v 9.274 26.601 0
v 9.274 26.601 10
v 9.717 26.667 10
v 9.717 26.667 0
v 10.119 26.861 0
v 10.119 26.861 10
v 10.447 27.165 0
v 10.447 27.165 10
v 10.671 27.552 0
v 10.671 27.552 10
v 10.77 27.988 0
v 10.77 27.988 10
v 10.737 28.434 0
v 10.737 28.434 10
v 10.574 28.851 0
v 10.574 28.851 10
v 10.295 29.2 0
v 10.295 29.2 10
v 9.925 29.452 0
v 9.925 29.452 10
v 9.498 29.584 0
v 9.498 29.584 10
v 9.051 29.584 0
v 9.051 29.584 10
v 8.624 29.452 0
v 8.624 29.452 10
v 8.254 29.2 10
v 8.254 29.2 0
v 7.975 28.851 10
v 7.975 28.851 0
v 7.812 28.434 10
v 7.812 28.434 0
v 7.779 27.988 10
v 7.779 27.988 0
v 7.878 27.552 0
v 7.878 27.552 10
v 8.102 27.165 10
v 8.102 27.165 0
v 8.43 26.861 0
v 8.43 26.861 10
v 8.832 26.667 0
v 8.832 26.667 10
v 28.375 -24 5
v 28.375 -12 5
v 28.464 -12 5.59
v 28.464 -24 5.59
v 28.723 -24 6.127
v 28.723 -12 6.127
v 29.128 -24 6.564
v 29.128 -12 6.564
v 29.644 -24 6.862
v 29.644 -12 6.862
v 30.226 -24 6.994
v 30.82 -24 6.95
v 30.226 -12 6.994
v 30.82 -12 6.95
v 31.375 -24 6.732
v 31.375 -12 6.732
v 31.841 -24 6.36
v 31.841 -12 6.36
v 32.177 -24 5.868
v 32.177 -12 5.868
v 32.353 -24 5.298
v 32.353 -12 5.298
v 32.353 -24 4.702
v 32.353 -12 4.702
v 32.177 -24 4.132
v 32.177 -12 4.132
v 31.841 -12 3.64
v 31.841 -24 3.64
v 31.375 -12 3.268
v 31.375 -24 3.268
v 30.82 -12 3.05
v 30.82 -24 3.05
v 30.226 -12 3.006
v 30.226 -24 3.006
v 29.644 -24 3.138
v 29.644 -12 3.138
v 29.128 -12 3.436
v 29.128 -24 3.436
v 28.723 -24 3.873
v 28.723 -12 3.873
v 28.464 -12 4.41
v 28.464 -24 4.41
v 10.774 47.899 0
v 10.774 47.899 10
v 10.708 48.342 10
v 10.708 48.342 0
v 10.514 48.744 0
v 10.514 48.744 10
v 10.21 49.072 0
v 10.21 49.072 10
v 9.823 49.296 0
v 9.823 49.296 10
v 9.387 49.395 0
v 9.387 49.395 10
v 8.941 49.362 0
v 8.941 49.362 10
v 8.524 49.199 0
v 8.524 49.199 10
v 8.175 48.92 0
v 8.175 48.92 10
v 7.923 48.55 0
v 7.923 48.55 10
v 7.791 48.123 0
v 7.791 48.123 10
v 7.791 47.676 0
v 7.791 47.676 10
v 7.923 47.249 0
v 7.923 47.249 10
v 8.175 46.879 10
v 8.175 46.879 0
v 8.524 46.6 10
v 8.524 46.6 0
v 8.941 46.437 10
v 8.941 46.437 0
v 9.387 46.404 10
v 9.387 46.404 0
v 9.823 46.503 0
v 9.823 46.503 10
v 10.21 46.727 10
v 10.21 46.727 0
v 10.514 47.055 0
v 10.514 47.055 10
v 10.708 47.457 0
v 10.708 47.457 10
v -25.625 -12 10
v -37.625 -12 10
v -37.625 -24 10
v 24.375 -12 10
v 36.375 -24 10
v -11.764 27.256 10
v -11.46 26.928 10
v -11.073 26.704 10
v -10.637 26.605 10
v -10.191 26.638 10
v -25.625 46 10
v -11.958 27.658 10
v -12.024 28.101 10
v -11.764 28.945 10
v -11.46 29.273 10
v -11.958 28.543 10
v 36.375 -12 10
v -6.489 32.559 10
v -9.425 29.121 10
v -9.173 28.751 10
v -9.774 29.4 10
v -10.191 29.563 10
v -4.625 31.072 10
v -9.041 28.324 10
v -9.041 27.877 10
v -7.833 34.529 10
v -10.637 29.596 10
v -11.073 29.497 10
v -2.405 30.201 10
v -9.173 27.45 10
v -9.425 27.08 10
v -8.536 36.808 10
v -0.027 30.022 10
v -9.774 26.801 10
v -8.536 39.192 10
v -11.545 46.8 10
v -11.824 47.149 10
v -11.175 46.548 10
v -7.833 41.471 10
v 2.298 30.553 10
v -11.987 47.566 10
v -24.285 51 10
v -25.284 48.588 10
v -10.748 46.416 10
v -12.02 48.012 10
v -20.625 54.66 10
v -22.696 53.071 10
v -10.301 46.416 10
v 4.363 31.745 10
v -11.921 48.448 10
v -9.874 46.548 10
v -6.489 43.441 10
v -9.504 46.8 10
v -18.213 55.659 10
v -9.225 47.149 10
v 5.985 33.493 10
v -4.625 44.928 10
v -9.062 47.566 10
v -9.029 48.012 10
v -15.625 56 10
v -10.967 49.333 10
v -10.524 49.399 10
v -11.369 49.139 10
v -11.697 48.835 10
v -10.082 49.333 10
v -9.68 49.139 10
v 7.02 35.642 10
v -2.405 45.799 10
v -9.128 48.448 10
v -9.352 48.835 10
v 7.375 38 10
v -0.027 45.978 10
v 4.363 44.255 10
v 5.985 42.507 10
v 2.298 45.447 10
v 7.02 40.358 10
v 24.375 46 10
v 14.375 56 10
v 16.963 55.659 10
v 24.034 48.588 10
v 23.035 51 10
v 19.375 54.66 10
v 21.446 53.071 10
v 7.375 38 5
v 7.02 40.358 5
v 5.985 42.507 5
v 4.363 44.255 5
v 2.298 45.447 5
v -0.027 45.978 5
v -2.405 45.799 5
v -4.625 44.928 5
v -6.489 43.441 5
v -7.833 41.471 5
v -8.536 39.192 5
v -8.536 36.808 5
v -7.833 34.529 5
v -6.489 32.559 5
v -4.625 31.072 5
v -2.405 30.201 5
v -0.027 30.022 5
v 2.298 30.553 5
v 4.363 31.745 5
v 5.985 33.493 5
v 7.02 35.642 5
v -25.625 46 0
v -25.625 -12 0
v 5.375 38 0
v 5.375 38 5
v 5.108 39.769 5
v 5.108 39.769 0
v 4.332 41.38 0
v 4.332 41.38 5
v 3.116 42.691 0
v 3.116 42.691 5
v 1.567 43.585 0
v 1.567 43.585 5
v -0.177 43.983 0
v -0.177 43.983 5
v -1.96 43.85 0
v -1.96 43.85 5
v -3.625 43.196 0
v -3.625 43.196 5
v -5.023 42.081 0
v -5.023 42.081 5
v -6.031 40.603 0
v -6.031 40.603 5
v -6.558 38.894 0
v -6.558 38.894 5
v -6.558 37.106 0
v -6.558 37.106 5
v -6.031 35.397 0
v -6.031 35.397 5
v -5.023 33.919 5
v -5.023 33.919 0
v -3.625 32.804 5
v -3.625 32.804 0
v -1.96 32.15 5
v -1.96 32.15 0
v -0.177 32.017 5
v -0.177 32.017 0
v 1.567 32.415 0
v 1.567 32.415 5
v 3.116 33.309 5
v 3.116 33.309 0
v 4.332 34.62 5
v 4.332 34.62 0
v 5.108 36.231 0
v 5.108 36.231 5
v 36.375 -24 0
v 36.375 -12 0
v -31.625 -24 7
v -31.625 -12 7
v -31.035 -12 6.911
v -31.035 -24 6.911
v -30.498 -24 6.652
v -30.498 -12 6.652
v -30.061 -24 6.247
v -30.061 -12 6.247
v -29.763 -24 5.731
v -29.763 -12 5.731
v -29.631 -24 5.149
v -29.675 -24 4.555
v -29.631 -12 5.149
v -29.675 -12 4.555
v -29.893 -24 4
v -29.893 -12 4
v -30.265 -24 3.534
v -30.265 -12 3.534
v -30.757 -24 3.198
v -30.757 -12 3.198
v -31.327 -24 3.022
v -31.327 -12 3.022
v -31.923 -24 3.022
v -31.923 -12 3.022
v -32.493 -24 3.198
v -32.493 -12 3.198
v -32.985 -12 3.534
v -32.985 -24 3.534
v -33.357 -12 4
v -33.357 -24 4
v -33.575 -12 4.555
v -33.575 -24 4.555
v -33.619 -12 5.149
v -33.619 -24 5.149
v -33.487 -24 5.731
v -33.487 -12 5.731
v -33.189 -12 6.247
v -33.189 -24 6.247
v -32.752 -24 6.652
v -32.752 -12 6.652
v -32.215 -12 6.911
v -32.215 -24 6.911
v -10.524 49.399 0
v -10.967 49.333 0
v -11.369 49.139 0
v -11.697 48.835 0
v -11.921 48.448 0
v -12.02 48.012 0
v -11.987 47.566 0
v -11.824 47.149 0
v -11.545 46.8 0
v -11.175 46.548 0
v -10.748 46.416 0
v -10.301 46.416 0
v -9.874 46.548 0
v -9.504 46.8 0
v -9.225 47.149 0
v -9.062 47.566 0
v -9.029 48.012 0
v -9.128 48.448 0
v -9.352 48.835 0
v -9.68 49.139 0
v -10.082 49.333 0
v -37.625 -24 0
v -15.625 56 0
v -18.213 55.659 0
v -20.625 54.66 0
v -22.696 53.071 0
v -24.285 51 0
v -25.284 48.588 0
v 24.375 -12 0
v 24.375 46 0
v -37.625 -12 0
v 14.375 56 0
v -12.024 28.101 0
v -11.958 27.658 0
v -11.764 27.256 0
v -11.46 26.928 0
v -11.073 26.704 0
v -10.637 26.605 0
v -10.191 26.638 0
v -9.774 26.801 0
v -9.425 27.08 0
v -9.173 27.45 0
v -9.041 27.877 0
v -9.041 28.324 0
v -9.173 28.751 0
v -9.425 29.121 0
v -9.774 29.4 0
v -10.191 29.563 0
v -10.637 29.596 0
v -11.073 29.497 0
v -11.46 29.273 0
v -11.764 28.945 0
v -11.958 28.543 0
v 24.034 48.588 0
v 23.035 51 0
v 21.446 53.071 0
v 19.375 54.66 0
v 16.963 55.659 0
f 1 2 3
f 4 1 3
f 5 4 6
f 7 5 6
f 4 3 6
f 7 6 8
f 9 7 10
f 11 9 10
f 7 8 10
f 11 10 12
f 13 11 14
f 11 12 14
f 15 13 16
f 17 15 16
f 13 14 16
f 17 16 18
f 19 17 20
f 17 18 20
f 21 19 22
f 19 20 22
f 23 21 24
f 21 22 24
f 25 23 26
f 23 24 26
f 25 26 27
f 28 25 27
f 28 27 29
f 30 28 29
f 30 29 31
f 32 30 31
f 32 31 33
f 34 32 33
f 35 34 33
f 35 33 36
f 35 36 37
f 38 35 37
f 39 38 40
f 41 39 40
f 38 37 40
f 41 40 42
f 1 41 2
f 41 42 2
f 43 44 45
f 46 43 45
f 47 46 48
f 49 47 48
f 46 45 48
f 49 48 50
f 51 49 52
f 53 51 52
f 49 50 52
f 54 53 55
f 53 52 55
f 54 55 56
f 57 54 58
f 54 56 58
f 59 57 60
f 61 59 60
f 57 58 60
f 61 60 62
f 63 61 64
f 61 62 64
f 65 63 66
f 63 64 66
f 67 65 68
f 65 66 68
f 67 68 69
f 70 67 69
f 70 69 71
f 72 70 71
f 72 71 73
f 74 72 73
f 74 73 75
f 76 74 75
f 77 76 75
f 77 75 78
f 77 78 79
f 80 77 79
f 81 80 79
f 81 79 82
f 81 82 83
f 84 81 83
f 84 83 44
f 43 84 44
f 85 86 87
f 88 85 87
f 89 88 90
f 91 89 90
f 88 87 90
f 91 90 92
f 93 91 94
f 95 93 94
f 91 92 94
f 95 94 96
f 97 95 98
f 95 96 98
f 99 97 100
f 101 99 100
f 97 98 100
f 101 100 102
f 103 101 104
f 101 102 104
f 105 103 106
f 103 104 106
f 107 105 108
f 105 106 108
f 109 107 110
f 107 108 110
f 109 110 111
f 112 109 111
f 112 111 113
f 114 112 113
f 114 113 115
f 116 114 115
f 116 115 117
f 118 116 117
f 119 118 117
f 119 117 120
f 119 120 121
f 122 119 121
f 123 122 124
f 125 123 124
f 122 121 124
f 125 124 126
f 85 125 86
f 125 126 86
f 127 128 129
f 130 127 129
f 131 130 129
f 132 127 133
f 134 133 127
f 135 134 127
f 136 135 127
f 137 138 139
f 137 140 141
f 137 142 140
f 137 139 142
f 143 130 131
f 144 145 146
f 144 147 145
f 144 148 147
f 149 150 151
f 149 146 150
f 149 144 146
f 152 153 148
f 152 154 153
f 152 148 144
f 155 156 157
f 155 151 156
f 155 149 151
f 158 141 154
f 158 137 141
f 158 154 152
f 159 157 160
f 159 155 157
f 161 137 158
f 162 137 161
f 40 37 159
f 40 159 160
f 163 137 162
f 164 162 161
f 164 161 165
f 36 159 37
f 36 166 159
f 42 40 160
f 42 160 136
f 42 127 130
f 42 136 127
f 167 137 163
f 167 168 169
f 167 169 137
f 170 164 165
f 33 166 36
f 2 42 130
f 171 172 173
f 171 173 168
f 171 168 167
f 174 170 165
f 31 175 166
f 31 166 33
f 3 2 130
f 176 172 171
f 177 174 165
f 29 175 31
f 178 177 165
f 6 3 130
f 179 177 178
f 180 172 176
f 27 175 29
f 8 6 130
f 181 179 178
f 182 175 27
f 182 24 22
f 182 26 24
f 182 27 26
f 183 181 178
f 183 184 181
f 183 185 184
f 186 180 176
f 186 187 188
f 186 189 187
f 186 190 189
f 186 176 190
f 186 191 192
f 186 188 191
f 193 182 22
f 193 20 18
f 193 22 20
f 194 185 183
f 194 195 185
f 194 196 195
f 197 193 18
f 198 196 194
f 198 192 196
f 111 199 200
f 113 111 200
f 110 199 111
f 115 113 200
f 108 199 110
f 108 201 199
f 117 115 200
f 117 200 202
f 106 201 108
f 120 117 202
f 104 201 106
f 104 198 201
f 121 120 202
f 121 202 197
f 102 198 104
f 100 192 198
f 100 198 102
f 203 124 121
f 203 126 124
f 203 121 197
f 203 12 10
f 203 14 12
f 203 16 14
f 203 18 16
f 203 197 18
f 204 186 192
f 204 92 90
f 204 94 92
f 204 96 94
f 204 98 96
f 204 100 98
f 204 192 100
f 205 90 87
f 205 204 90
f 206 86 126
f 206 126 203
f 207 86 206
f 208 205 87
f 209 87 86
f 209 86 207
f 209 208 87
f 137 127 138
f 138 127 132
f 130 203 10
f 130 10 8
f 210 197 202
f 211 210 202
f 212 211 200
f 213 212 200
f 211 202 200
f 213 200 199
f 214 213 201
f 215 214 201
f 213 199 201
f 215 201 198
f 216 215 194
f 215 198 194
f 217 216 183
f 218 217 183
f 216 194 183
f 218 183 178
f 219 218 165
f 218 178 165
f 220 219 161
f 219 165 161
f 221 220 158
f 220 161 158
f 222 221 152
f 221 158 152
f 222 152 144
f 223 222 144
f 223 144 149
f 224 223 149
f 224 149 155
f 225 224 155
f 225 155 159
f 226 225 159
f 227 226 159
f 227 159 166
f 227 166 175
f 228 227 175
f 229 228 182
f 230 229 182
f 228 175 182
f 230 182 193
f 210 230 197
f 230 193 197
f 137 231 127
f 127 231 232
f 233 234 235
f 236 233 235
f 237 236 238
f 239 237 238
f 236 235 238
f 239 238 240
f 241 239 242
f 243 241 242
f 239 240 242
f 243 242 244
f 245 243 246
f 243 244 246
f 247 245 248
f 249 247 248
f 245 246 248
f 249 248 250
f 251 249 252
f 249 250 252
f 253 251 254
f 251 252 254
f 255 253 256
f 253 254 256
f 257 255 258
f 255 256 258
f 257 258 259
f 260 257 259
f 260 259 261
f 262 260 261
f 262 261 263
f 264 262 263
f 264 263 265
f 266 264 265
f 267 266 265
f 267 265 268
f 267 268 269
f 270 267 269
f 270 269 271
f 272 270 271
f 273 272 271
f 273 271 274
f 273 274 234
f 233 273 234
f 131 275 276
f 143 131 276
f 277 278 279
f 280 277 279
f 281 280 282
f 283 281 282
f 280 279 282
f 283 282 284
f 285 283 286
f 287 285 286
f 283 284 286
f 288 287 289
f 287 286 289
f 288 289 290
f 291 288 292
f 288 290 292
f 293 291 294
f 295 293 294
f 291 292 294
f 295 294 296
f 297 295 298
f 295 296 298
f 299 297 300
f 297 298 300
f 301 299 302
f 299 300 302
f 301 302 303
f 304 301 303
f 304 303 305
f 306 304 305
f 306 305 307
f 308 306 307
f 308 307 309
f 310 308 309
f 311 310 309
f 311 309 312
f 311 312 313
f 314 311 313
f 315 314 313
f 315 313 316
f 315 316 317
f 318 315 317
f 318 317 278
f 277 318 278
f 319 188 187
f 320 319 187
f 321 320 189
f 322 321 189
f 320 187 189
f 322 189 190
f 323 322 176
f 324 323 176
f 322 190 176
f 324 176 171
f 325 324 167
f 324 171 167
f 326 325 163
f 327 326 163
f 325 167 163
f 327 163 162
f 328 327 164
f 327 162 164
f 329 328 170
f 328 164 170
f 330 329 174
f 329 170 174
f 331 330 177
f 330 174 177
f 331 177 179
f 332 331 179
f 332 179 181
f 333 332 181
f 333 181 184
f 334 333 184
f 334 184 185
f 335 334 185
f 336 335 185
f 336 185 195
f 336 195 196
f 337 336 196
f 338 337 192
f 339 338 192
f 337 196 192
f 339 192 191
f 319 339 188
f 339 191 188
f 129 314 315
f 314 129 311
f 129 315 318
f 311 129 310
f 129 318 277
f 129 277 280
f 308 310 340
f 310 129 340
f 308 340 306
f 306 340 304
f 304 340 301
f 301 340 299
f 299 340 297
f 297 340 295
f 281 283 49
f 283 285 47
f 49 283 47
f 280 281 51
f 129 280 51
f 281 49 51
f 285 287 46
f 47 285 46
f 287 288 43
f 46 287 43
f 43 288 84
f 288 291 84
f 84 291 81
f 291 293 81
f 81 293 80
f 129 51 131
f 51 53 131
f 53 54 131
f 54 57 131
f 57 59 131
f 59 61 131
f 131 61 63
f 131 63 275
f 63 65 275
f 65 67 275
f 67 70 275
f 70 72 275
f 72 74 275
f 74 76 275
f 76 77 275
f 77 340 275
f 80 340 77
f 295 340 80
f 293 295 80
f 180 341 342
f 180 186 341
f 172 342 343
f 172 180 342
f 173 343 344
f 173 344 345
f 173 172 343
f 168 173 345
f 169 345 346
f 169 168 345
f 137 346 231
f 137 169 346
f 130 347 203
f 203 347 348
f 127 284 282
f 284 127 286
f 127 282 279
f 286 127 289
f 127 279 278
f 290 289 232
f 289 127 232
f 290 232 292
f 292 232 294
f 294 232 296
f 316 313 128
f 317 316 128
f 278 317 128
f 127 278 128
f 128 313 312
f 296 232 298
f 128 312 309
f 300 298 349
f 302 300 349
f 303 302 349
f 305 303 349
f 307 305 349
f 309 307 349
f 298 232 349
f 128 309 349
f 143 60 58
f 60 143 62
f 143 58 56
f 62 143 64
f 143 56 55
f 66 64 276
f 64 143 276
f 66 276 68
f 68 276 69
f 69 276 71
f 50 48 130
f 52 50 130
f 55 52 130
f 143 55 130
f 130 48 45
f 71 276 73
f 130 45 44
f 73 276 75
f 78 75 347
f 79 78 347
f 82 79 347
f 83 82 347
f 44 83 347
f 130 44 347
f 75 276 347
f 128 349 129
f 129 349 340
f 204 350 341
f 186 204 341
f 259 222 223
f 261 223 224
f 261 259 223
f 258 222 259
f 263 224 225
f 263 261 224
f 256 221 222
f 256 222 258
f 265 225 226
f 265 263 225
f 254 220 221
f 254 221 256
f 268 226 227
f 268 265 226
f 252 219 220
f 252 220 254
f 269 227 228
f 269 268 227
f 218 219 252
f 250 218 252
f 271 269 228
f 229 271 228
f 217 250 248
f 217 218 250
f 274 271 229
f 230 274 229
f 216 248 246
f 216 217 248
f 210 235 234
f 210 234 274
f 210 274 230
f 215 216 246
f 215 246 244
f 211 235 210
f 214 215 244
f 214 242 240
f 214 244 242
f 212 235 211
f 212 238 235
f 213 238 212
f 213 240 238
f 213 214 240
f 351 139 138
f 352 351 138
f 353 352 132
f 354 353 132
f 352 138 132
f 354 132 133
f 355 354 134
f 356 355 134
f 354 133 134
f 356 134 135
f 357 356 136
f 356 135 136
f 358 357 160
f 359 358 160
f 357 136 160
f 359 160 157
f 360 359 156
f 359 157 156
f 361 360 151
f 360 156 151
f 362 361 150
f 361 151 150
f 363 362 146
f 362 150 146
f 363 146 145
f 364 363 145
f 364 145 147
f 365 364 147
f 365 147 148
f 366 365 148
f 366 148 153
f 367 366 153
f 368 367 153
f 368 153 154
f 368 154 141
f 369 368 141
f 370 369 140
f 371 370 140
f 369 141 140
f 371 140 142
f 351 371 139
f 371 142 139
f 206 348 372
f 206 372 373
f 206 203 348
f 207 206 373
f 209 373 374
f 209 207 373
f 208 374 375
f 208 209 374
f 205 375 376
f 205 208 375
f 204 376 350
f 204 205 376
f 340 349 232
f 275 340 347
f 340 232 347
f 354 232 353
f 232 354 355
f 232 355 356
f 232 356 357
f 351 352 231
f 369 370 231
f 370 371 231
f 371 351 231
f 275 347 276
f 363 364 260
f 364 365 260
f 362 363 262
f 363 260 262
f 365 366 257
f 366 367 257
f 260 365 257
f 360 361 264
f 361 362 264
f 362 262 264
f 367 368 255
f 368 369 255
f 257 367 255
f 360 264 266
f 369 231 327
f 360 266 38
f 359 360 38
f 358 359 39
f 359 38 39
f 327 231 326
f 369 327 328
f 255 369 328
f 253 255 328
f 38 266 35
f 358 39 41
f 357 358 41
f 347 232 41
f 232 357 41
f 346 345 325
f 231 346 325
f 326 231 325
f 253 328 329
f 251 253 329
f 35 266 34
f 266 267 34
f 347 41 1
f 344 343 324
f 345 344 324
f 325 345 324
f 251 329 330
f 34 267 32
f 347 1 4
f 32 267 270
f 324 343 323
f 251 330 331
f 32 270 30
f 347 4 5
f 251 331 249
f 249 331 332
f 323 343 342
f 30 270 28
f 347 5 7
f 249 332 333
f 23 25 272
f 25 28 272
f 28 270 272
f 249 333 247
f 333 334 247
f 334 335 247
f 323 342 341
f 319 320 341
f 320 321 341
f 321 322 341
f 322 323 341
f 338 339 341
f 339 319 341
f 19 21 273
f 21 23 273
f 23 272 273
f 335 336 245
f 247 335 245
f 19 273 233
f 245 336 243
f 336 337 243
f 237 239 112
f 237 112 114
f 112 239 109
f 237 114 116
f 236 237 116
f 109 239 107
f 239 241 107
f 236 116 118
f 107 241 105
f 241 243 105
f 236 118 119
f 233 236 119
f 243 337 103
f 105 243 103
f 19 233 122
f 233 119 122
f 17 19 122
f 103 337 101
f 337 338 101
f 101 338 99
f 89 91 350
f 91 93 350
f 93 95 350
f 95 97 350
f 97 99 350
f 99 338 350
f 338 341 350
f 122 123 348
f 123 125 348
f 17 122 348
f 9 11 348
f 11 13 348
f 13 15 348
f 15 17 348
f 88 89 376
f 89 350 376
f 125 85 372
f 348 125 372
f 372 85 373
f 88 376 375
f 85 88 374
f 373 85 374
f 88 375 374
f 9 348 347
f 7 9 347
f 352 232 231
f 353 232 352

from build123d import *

# Parameters (mm, degrees)
BOSS_EXTRUDE1_DEPTH = 10
SKETCH2_R           = 8
CUT_EXTRUDE1_DEPTH  = 5
FILLET1_R           = 10
SKETCH4_R           = 2
CUT_EXTRUDE3_DEPTH  = 21
SKETCH5_R           = 2
CUT_EXTRUDE4_DEPTH  = 25
SKETCH6_R           = 1.5
CUT_EXTRUDE5_DEPTH  = 10
CIRPATTERN1_COUNT   = 4
SKETCH8_R           = 6
CUT_EXTRUDE8_DEPTH  = 10


with BuildPart() as part:
    # Sketch1 → Boss-Extrude1 (new body)
    with BuildSketch(Plane.XY):
        Polygon((-37.625, -24), (36.375, -24), (36.375, -12), (24.375, -12), (24.375, 56), (-25.625, 56), (-25.625, -12), (-37.625, -12), align=None)
    extrude(amount=BOSS_EXTRUDE1_DEPTH)

    # Sketch2 → Cut-Extrude1 (cut)
    with BuildSketch(Plane.XY.offset(10)):
        with Locations((-0.625, 38)):
            Circle(SKETCH2_R)
    extrude(amount=-CUT_EXTRUDE1_DEPTH, mode=Mode.SUBTRACT)

    # Fillet1
    fillet1_edges = [part.edges().sort_by_distance(p)[0] for p in [
        (24.375, 56, 5),
        (-25.625, 56, 5),
    ]]
    fillet(fillet1_edges, radius=FILLET1_R)

    # Sketch4 → Cut-Extrude3 (cut)
    with BuildSketch(Plane(origin=(0, -12, 0), x_dir=(1, 0, 0), z_dir=(0, 1, 0))):
        with Locations(Location((30.375, -5, 0), (0, 0, 180))):
            Circle(SKETCH4_R)
    extrude(amount=-CUT_EXTRUDE3_DEPTH, mode=Mode.SUBTRACT)

    # Sketch5 → Cut-Extrude4 (cut)
    with BuildSketch(Plane(origin=(0, -12, 0), x_dir=(1, 0, 0), z_dir=(0, 1, 0))):
        with Locations(Location((-31.625, -5, 0), (0, 0, 270))):
            Circle(SKETCH5_R)
    extrude(amount=-CUT_EXTRUDE4_DEPTH, mode=Mode.SUBTRACT)

    # Sketch6 → Cut-Extrude5 (cut)
    with BuildSketch(Plane.XY.offset(10)):
        with Locations((9.274494937, 47.899494937)):
            Circle(SKETCH6_R)
    cut_extrude5 = extrude(amount=-CUT_EXTRUDE5_DEPTH, mode=Mode.SUBTRACT)

    # CirPattern1: Cut-Extrude5 ×4 about axis
    cirpattern1_axis = Axis((-0.625, 38, 0), (0, 0, 1))
    for i in range(1, CIRPATTERN1_COUNT):
        add(cut_extrude5.rotate(cirpattern1_axis, i * 360 / CIRPATTERN1_COUNT), mode=Mode.SUBTRACT)

    # Sketch8 → Cut-Extrude8 (cut)
    with BuildSketch(Plane.XY.offset(10)):
        with Locations((-0.625, 38)):
            Circle(SKETCH8_R)
    extrude(amount=-CUT_EXTRUDE8_DEPTH, mode=Mode.SUBTRACT)


solid = part.part
